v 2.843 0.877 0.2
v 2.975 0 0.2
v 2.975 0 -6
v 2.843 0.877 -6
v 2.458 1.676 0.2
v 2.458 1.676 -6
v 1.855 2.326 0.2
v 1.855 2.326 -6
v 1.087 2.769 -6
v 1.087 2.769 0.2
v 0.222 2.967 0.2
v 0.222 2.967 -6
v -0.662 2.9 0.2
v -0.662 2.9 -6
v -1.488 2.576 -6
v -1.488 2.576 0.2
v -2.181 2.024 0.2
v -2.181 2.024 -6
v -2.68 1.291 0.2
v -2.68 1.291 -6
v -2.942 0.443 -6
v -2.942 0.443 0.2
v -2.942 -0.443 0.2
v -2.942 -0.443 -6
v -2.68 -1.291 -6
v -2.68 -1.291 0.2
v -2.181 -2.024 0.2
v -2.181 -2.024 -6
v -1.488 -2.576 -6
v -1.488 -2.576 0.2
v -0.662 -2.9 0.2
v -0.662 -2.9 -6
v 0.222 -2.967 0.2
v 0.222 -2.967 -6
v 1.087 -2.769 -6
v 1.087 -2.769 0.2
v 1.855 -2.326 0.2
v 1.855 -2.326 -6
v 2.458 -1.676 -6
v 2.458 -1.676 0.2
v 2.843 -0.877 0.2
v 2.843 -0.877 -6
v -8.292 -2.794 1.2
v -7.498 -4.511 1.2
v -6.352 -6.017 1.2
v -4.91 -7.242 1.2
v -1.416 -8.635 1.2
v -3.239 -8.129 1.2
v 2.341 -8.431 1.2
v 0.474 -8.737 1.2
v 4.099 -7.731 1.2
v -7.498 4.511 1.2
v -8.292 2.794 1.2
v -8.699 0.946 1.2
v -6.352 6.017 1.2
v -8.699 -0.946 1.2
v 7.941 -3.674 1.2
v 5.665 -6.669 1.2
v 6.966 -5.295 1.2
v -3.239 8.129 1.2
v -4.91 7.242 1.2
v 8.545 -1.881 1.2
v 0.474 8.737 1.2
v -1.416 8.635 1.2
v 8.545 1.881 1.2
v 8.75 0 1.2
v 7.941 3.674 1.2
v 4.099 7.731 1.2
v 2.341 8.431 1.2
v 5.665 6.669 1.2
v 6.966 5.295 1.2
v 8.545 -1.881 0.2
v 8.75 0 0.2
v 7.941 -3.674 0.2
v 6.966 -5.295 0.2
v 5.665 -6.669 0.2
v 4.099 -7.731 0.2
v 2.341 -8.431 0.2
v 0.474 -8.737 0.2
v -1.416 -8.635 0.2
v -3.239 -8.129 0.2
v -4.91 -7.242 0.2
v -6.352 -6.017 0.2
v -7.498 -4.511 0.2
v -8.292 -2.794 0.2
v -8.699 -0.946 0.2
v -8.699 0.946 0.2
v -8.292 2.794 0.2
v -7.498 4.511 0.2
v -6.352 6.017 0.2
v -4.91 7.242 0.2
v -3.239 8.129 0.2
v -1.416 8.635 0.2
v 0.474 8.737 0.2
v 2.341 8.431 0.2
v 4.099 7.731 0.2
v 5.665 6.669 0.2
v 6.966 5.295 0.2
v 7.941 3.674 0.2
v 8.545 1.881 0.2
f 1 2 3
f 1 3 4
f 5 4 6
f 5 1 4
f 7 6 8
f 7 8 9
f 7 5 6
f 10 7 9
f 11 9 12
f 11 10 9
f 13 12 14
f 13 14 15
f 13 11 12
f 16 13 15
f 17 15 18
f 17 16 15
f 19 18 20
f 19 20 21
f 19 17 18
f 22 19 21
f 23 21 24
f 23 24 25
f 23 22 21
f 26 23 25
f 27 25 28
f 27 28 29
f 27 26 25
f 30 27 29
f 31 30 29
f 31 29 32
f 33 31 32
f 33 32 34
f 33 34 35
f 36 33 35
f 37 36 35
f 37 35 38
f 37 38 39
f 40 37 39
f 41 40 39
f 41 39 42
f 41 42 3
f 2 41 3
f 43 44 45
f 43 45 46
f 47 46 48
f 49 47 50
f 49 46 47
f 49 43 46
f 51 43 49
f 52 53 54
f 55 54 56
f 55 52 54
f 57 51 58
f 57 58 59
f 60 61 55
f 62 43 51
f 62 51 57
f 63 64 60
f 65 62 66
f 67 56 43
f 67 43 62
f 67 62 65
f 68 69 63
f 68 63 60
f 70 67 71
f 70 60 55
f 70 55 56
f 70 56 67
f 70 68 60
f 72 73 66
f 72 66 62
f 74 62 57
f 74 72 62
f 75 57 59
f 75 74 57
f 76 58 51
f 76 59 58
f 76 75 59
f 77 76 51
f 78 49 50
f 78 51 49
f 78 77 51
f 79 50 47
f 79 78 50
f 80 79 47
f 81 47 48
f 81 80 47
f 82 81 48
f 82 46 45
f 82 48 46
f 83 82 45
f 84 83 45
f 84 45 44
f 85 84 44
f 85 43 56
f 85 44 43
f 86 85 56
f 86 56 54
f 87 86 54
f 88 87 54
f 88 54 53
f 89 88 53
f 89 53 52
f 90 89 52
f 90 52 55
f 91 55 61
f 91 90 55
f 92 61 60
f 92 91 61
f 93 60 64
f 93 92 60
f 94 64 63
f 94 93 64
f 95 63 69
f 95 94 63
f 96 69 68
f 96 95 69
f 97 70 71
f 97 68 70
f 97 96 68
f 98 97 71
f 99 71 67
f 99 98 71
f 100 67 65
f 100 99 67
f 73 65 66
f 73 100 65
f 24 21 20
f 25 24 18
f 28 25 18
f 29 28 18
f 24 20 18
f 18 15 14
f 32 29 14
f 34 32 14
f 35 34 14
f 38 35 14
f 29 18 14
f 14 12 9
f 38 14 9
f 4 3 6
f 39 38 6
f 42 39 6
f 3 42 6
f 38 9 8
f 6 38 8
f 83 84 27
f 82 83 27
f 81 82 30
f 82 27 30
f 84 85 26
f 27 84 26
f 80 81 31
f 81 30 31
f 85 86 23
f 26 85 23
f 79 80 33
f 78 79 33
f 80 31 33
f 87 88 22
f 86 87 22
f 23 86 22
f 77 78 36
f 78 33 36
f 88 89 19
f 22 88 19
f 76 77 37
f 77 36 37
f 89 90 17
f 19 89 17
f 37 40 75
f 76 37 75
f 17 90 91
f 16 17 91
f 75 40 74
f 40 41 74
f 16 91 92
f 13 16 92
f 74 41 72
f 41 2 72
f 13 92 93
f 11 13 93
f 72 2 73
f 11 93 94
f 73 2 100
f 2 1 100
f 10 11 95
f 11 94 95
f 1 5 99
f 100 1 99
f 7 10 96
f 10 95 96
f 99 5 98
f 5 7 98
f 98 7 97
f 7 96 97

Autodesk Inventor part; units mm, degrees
ref_plane "YZ Plane" through (0, 0, 0) normal (1, 0, 0) x (0, 1, 0)
ref_plane "XZ Plane" through (0, 0, 0) normal (0, 1, 0) x (-1, 0, 0)
ref_plane "XY Plane" through (0, 0, 0) normal (0, 0, 1) x (1, 0, 0)
sketch "Sketch1" plane through (0, 0, 0) normal (0, 0, 1) x (1, 0, 0)
  circle A0 centre (0, 0) radius 3.175 projected
  circle A1 centre (0, 0) radius 2.975
  arc A2 (-4.0862, -4.8606) -> (4.0862, 4.8606) centre (0, 0) ccw projected
  point P0 (0, 0)
  dimension "d0" = 0.2
extrude "Extrusion1" add sketch "Sketch1" against normal blind 6 contours A1
sketch "Sketch2" plane through (0, 0, 0) normal (0, 0, 1) x (1, 0, 0)
  circle A0 centre (0, 0) radius 2.975 projected
  point P0 (0, 0)
extrude "Extrusion2" add sketch "Sketch2" along normal blind 0.2
sketch "Sketch3" plane through (0, 0, 0.2) normal (0, 0, 1) x (1, 0, 0)
  circle A0 centre (0, 0) radius 6.75 projected
  circle A1 centre (0, 0) radius 19.05 projected
  circle A2 centre (0, 0) radius 8.75
  point P0 (0, 0)
  dimension "d5" = 2
extrude "Extrusion3" add sketch "Sketch3" along normal blind 1 contours A0 | A2
properties part number "CartWheelCap"
